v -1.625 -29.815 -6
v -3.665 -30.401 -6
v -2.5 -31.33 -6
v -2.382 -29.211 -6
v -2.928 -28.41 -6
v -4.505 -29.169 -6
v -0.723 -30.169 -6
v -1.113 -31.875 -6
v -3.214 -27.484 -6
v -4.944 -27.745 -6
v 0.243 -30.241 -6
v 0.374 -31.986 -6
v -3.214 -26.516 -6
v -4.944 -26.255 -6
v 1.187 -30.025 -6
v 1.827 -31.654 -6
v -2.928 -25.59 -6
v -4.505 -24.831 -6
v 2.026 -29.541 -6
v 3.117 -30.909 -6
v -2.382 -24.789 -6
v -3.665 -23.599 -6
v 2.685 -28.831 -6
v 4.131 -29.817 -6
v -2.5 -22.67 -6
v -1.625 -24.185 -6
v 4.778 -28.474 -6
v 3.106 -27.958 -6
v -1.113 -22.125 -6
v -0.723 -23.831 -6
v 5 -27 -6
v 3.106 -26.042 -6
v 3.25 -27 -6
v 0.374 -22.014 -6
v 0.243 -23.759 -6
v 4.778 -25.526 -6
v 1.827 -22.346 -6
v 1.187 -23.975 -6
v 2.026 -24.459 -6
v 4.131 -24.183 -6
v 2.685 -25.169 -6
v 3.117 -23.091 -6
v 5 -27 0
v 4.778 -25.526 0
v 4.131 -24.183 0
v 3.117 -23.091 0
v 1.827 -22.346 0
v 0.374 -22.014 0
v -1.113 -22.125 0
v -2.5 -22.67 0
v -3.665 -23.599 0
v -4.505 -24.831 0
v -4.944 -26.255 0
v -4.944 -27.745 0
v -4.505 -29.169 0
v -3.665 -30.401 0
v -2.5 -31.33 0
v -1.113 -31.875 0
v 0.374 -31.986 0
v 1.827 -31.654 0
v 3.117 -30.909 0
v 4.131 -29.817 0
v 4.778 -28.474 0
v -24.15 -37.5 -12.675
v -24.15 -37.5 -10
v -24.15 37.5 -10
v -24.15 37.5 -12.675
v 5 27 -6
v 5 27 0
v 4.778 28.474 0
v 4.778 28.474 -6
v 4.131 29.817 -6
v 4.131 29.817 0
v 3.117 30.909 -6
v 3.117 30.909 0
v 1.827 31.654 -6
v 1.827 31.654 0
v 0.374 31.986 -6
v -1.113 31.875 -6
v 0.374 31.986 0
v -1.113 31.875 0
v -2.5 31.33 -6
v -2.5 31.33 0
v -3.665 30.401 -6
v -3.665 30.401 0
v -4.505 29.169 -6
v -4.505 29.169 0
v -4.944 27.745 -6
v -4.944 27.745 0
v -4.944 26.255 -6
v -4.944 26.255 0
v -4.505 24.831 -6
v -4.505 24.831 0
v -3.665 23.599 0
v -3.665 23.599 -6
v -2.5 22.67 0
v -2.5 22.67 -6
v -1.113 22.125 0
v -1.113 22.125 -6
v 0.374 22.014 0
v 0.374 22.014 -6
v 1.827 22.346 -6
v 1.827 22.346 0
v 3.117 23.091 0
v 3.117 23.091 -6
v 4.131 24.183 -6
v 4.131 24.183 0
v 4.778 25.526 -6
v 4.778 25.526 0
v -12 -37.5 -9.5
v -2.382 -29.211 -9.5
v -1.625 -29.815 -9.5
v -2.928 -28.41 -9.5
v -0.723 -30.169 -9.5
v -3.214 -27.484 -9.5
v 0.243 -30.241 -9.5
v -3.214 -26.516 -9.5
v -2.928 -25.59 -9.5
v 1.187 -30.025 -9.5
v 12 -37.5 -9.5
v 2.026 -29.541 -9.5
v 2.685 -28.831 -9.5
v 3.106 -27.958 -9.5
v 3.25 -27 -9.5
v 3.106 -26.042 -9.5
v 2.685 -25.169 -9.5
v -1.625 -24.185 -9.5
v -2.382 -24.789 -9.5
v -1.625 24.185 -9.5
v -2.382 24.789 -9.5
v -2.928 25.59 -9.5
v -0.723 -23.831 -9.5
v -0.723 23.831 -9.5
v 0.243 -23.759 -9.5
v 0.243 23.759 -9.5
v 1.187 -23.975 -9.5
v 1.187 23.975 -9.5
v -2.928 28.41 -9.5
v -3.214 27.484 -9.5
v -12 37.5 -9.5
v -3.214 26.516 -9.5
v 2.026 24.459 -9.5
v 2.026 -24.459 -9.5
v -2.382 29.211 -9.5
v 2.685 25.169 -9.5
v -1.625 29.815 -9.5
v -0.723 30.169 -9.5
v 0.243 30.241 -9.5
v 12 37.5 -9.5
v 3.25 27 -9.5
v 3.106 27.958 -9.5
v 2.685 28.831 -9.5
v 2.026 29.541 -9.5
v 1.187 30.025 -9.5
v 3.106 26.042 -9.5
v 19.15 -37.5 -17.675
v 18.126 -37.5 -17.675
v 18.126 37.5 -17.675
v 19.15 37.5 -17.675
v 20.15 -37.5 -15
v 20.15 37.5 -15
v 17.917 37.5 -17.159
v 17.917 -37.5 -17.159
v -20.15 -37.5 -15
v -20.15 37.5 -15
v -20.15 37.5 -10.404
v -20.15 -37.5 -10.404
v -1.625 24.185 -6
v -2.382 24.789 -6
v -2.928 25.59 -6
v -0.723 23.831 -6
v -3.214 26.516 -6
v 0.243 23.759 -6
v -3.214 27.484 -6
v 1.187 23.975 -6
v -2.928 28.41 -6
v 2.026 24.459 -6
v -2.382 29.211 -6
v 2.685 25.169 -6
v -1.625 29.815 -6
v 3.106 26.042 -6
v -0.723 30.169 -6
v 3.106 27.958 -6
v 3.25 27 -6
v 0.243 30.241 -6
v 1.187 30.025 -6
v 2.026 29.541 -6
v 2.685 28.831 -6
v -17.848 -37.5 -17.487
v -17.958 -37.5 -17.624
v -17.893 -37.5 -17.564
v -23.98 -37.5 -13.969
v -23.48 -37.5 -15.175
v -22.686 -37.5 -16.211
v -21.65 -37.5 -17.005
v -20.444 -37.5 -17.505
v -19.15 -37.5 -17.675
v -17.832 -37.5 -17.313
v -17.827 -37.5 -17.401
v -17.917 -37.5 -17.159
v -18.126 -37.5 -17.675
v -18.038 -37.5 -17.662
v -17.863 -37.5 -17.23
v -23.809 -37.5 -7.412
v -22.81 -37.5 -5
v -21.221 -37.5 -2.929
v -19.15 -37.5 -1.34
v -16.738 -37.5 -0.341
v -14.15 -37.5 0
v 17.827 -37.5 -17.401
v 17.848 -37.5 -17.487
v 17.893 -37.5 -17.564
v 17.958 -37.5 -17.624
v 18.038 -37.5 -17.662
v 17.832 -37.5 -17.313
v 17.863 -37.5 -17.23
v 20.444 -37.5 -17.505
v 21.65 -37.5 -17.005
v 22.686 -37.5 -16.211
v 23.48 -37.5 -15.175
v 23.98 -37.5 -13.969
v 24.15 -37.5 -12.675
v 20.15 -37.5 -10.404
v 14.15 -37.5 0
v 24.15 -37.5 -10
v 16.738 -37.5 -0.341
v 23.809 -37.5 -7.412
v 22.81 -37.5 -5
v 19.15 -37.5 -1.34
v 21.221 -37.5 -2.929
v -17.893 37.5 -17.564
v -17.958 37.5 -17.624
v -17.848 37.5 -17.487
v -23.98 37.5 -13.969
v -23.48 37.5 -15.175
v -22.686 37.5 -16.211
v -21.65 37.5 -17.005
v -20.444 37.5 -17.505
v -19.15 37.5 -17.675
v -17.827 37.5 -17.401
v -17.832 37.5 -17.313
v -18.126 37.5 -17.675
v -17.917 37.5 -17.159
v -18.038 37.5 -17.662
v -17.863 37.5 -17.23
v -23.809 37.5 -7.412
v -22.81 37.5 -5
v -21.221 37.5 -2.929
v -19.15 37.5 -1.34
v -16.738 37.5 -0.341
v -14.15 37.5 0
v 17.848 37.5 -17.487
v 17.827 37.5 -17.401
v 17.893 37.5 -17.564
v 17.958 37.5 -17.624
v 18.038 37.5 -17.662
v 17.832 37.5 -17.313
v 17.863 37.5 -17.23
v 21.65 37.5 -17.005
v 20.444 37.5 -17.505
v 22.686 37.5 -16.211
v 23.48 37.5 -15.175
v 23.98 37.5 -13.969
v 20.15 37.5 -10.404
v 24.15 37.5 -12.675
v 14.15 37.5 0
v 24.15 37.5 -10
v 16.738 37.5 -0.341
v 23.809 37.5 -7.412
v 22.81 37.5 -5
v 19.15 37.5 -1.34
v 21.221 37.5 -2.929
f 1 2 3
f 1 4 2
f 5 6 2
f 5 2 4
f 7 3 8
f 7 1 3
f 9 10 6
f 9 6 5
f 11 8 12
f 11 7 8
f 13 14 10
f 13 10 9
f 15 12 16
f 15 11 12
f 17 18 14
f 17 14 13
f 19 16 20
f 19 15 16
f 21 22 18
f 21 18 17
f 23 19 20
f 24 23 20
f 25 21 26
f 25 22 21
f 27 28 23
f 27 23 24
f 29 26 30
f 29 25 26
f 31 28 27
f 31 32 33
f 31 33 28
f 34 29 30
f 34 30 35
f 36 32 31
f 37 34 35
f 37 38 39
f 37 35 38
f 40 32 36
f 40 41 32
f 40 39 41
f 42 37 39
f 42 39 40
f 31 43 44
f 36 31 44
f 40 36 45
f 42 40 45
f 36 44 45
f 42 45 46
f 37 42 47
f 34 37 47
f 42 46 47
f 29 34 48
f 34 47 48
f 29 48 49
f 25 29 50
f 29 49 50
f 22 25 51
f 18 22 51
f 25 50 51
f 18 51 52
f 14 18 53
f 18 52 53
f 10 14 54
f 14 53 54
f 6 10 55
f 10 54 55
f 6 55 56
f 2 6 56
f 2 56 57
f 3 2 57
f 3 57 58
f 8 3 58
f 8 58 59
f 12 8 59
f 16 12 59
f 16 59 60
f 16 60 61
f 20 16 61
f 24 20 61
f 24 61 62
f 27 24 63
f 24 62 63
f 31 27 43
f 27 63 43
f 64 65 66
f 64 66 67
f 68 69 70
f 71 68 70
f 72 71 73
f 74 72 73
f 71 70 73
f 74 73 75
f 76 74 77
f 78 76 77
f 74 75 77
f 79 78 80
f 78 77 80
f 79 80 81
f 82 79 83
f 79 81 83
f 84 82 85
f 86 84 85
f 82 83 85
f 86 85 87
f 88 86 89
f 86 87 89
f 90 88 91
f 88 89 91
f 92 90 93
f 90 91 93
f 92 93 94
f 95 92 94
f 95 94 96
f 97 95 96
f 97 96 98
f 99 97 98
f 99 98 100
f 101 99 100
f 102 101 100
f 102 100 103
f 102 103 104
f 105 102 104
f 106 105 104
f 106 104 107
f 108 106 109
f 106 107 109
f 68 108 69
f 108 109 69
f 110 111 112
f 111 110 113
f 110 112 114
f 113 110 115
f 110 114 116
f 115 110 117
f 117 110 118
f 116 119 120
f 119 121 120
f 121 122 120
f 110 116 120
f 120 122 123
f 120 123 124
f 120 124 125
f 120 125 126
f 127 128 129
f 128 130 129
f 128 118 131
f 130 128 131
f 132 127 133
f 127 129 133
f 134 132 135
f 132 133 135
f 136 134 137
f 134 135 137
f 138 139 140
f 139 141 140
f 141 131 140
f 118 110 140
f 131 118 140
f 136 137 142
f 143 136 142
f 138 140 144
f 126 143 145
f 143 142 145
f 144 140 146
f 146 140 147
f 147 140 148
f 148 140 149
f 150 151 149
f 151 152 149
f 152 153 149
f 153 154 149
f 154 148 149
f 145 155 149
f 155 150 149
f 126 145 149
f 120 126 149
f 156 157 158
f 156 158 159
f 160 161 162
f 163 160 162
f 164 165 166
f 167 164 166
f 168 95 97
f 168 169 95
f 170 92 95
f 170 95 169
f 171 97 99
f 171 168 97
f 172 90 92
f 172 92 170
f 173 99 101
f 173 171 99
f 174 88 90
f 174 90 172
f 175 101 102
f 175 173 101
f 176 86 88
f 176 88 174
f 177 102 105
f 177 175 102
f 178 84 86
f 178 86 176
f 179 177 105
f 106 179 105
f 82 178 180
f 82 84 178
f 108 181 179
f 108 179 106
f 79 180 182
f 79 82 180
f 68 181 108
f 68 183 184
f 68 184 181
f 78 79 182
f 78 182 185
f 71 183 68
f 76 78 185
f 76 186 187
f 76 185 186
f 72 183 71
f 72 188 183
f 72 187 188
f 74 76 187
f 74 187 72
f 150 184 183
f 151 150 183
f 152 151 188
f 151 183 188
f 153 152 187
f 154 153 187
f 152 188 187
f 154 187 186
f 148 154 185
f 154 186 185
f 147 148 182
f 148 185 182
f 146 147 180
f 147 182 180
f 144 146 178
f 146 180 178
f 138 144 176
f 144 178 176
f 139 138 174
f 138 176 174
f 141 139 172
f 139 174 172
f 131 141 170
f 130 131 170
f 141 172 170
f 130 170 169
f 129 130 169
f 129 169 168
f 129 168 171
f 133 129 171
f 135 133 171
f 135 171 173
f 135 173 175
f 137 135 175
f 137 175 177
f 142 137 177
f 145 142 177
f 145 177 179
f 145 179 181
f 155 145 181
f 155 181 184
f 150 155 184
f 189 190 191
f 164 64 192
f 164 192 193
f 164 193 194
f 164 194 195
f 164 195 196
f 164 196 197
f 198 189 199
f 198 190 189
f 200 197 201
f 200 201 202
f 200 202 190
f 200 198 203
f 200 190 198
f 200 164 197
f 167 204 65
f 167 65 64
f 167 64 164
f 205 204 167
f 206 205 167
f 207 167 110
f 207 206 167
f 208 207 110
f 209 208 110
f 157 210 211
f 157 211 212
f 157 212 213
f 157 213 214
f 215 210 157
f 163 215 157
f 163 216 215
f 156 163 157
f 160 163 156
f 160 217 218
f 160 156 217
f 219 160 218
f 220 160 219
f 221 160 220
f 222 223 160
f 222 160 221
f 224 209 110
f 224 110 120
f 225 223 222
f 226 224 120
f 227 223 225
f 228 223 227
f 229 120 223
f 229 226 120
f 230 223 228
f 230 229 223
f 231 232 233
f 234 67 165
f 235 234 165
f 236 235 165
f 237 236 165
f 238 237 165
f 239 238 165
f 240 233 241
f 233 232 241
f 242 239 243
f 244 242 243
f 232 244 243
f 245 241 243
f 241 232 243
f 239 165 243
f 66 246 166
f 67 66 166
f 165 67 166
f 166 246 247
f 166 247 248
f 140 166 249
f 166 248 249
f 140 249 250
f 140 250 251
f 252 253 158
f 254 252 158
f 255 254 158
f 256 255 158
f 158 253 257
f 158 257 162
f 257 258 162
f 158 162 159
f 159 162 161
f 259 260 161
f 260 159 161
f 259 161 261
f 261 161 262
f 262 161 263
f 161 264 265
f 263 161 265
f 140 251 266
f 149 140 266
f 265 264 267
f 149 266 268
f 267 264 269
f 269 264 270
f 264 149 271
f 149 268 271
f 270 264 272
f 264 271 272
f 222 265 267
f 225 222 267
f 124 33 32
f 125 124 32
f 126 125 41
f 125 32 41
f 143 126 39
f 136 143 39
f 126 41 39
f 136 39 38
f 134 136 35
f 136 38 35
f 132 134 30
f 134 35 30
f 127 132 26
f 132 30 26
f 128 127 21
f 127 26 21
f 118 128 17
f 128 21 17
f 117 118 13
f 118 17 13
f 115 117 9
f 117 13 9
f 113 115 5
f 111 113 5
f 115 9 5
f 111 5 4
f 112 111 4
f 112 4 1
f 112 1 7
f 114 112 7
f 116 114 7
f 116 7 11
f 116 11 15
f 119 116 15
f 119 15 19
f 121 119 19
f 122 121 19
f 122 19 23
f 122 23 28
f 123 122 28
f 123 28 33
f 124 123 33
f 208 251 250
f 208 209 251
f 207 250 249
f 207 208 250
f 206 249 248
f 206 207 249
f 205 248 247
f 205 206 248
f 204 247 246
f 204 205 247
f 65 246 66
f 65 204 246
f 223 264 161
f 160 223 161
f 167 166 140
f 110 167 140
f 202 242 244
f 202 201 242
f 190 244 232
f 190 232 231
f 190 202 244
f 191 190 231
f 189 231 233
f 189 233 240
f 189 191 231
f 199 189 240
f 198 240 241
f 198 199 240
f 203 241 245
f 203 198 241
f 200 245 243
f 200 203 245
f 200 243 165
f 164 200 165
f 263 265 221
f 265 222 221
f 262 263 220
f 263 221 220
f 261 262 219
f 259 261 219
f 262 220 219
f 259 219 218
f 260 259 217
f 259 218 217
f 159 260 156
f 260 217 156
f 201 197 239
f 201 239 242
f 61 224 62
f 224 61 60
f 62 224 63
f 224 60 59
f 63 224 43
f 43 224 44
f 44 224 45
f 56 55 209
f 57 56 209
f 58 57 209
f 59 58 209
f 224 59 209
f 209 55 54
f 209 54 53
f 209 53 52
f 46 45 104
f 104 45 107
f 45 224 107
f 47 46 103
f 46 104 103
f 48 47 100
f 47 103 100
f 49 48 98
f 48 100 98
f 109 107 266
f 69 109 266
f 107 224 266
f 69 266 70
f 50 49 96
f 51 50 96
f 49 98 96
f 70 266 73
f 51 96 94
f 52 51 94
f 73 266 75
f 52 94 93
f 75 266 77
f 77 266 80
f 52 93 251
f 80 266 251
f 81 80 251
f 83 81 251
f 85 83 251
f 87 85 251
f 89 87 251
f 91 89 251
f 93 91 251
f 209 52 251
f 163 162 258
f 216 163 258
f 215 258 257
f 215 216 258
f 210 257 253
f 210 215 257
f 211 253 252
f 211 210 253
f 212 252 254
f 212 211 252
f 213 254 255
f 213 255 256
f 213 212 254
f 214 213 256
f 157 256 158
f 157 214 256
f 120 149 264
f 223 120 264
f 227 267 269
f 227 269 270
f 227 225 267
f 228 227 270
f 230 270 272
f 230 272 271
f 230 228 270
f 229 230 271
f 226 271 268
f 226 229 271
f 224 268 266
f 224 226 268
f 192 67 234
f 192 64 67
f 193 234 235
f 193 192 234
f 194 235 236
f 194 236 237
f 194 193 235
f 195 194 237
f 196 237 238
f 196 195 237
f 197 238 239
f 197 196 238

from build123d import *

# Parameters (mm, degrees)
F1_DEPTH = 75
F2_R     = 0.3
F3_R     = 10
F4_R     = 5
F6_R     = 3.25
F7_DEPTH = 25
F8_R     = 5
F8_R_2   = 3.25
F9_DEPTH = 6


with BuildPart() as f1:
    # F0 (on Front) → F1 (new body)
    with BuildSketch(Plane.XZ):
        Polygon((-20.15, 4.595843), (-12, 5.5), (12, 5.5), (20.15, 4.595843), (20.15, 0), (17.384257, -2.674988), (24.15, -2.674988), (24.15, 0), (24.15, 15), (-24.15, 15), (-24.15, 0), (-24.15, -2.674988), (-17.384257, -2.674988), (-20.15, 0), align=None)
    extrude(amount=F1_DEPTH)

    # F2
    f2_edges = [f1.edges().sort_by_distance(p)[0] for p in [
        (-17.384257, -37.5, -2.674988),
        (17.384257, -37.5, -2.674988),
    ]]
    fillet(f2_edges, radius=F2_R)

    # F3
    f3_edges = [f1.edges().sort_by_distance(p)[0] for p in [
        (-24.15, -37.5, 15),
        (24.15, -37.5, 15),
    ]]
    fillet(f3_edges, radius=F3_R)

    # F4
    f4_edges = [f1.edges().sort_by_distance(p)[0] for p in [
        (-24.15, -37.5, -2.674988),
        (24.15, -37.5, -2.674988),
    ]]
    fillet(f4_edges, radius=F4_R)


with BuildPart() as f1_1:
    # F5: moved
    add(f1.part.moved(Location((0, 37.5, 0))))

    # F6 (on face) → F7 (cut)
    with BuildSketch(Plane.XY.offset(15)):
        with Locations((0, 27)):
            Circle(F6_R)
        with Locations((0, -27)):
            Circle(F6_R)
    extrude(amount=-F7_DEPTH, mode=Mode.SUBTRACT)

    # F8 (on face) → F9 (cut)
    with BuildSketch(Plane.XY.offset(15)):
        with Locations((0, 27)):
            Circle(F8_R)
        with Locations((0, 27)):
            Circle(F8_R_2, mode=Mode.SUBTRACT)
        with Locations((0, -27)):
            Circle(F8_R)
        with Locations((0, -27)):
            Circle(F8_R_2, mode=Mode.SUBTRACT)
    extrude(amount=-F9_DEPTH, mode=Mode.SUBTRACT)


with BuildPart() as f1_2:
    # F10: moved
    add(f1_1.part.moved(Location((0, 0, -15))))


solid = f1_2.part
